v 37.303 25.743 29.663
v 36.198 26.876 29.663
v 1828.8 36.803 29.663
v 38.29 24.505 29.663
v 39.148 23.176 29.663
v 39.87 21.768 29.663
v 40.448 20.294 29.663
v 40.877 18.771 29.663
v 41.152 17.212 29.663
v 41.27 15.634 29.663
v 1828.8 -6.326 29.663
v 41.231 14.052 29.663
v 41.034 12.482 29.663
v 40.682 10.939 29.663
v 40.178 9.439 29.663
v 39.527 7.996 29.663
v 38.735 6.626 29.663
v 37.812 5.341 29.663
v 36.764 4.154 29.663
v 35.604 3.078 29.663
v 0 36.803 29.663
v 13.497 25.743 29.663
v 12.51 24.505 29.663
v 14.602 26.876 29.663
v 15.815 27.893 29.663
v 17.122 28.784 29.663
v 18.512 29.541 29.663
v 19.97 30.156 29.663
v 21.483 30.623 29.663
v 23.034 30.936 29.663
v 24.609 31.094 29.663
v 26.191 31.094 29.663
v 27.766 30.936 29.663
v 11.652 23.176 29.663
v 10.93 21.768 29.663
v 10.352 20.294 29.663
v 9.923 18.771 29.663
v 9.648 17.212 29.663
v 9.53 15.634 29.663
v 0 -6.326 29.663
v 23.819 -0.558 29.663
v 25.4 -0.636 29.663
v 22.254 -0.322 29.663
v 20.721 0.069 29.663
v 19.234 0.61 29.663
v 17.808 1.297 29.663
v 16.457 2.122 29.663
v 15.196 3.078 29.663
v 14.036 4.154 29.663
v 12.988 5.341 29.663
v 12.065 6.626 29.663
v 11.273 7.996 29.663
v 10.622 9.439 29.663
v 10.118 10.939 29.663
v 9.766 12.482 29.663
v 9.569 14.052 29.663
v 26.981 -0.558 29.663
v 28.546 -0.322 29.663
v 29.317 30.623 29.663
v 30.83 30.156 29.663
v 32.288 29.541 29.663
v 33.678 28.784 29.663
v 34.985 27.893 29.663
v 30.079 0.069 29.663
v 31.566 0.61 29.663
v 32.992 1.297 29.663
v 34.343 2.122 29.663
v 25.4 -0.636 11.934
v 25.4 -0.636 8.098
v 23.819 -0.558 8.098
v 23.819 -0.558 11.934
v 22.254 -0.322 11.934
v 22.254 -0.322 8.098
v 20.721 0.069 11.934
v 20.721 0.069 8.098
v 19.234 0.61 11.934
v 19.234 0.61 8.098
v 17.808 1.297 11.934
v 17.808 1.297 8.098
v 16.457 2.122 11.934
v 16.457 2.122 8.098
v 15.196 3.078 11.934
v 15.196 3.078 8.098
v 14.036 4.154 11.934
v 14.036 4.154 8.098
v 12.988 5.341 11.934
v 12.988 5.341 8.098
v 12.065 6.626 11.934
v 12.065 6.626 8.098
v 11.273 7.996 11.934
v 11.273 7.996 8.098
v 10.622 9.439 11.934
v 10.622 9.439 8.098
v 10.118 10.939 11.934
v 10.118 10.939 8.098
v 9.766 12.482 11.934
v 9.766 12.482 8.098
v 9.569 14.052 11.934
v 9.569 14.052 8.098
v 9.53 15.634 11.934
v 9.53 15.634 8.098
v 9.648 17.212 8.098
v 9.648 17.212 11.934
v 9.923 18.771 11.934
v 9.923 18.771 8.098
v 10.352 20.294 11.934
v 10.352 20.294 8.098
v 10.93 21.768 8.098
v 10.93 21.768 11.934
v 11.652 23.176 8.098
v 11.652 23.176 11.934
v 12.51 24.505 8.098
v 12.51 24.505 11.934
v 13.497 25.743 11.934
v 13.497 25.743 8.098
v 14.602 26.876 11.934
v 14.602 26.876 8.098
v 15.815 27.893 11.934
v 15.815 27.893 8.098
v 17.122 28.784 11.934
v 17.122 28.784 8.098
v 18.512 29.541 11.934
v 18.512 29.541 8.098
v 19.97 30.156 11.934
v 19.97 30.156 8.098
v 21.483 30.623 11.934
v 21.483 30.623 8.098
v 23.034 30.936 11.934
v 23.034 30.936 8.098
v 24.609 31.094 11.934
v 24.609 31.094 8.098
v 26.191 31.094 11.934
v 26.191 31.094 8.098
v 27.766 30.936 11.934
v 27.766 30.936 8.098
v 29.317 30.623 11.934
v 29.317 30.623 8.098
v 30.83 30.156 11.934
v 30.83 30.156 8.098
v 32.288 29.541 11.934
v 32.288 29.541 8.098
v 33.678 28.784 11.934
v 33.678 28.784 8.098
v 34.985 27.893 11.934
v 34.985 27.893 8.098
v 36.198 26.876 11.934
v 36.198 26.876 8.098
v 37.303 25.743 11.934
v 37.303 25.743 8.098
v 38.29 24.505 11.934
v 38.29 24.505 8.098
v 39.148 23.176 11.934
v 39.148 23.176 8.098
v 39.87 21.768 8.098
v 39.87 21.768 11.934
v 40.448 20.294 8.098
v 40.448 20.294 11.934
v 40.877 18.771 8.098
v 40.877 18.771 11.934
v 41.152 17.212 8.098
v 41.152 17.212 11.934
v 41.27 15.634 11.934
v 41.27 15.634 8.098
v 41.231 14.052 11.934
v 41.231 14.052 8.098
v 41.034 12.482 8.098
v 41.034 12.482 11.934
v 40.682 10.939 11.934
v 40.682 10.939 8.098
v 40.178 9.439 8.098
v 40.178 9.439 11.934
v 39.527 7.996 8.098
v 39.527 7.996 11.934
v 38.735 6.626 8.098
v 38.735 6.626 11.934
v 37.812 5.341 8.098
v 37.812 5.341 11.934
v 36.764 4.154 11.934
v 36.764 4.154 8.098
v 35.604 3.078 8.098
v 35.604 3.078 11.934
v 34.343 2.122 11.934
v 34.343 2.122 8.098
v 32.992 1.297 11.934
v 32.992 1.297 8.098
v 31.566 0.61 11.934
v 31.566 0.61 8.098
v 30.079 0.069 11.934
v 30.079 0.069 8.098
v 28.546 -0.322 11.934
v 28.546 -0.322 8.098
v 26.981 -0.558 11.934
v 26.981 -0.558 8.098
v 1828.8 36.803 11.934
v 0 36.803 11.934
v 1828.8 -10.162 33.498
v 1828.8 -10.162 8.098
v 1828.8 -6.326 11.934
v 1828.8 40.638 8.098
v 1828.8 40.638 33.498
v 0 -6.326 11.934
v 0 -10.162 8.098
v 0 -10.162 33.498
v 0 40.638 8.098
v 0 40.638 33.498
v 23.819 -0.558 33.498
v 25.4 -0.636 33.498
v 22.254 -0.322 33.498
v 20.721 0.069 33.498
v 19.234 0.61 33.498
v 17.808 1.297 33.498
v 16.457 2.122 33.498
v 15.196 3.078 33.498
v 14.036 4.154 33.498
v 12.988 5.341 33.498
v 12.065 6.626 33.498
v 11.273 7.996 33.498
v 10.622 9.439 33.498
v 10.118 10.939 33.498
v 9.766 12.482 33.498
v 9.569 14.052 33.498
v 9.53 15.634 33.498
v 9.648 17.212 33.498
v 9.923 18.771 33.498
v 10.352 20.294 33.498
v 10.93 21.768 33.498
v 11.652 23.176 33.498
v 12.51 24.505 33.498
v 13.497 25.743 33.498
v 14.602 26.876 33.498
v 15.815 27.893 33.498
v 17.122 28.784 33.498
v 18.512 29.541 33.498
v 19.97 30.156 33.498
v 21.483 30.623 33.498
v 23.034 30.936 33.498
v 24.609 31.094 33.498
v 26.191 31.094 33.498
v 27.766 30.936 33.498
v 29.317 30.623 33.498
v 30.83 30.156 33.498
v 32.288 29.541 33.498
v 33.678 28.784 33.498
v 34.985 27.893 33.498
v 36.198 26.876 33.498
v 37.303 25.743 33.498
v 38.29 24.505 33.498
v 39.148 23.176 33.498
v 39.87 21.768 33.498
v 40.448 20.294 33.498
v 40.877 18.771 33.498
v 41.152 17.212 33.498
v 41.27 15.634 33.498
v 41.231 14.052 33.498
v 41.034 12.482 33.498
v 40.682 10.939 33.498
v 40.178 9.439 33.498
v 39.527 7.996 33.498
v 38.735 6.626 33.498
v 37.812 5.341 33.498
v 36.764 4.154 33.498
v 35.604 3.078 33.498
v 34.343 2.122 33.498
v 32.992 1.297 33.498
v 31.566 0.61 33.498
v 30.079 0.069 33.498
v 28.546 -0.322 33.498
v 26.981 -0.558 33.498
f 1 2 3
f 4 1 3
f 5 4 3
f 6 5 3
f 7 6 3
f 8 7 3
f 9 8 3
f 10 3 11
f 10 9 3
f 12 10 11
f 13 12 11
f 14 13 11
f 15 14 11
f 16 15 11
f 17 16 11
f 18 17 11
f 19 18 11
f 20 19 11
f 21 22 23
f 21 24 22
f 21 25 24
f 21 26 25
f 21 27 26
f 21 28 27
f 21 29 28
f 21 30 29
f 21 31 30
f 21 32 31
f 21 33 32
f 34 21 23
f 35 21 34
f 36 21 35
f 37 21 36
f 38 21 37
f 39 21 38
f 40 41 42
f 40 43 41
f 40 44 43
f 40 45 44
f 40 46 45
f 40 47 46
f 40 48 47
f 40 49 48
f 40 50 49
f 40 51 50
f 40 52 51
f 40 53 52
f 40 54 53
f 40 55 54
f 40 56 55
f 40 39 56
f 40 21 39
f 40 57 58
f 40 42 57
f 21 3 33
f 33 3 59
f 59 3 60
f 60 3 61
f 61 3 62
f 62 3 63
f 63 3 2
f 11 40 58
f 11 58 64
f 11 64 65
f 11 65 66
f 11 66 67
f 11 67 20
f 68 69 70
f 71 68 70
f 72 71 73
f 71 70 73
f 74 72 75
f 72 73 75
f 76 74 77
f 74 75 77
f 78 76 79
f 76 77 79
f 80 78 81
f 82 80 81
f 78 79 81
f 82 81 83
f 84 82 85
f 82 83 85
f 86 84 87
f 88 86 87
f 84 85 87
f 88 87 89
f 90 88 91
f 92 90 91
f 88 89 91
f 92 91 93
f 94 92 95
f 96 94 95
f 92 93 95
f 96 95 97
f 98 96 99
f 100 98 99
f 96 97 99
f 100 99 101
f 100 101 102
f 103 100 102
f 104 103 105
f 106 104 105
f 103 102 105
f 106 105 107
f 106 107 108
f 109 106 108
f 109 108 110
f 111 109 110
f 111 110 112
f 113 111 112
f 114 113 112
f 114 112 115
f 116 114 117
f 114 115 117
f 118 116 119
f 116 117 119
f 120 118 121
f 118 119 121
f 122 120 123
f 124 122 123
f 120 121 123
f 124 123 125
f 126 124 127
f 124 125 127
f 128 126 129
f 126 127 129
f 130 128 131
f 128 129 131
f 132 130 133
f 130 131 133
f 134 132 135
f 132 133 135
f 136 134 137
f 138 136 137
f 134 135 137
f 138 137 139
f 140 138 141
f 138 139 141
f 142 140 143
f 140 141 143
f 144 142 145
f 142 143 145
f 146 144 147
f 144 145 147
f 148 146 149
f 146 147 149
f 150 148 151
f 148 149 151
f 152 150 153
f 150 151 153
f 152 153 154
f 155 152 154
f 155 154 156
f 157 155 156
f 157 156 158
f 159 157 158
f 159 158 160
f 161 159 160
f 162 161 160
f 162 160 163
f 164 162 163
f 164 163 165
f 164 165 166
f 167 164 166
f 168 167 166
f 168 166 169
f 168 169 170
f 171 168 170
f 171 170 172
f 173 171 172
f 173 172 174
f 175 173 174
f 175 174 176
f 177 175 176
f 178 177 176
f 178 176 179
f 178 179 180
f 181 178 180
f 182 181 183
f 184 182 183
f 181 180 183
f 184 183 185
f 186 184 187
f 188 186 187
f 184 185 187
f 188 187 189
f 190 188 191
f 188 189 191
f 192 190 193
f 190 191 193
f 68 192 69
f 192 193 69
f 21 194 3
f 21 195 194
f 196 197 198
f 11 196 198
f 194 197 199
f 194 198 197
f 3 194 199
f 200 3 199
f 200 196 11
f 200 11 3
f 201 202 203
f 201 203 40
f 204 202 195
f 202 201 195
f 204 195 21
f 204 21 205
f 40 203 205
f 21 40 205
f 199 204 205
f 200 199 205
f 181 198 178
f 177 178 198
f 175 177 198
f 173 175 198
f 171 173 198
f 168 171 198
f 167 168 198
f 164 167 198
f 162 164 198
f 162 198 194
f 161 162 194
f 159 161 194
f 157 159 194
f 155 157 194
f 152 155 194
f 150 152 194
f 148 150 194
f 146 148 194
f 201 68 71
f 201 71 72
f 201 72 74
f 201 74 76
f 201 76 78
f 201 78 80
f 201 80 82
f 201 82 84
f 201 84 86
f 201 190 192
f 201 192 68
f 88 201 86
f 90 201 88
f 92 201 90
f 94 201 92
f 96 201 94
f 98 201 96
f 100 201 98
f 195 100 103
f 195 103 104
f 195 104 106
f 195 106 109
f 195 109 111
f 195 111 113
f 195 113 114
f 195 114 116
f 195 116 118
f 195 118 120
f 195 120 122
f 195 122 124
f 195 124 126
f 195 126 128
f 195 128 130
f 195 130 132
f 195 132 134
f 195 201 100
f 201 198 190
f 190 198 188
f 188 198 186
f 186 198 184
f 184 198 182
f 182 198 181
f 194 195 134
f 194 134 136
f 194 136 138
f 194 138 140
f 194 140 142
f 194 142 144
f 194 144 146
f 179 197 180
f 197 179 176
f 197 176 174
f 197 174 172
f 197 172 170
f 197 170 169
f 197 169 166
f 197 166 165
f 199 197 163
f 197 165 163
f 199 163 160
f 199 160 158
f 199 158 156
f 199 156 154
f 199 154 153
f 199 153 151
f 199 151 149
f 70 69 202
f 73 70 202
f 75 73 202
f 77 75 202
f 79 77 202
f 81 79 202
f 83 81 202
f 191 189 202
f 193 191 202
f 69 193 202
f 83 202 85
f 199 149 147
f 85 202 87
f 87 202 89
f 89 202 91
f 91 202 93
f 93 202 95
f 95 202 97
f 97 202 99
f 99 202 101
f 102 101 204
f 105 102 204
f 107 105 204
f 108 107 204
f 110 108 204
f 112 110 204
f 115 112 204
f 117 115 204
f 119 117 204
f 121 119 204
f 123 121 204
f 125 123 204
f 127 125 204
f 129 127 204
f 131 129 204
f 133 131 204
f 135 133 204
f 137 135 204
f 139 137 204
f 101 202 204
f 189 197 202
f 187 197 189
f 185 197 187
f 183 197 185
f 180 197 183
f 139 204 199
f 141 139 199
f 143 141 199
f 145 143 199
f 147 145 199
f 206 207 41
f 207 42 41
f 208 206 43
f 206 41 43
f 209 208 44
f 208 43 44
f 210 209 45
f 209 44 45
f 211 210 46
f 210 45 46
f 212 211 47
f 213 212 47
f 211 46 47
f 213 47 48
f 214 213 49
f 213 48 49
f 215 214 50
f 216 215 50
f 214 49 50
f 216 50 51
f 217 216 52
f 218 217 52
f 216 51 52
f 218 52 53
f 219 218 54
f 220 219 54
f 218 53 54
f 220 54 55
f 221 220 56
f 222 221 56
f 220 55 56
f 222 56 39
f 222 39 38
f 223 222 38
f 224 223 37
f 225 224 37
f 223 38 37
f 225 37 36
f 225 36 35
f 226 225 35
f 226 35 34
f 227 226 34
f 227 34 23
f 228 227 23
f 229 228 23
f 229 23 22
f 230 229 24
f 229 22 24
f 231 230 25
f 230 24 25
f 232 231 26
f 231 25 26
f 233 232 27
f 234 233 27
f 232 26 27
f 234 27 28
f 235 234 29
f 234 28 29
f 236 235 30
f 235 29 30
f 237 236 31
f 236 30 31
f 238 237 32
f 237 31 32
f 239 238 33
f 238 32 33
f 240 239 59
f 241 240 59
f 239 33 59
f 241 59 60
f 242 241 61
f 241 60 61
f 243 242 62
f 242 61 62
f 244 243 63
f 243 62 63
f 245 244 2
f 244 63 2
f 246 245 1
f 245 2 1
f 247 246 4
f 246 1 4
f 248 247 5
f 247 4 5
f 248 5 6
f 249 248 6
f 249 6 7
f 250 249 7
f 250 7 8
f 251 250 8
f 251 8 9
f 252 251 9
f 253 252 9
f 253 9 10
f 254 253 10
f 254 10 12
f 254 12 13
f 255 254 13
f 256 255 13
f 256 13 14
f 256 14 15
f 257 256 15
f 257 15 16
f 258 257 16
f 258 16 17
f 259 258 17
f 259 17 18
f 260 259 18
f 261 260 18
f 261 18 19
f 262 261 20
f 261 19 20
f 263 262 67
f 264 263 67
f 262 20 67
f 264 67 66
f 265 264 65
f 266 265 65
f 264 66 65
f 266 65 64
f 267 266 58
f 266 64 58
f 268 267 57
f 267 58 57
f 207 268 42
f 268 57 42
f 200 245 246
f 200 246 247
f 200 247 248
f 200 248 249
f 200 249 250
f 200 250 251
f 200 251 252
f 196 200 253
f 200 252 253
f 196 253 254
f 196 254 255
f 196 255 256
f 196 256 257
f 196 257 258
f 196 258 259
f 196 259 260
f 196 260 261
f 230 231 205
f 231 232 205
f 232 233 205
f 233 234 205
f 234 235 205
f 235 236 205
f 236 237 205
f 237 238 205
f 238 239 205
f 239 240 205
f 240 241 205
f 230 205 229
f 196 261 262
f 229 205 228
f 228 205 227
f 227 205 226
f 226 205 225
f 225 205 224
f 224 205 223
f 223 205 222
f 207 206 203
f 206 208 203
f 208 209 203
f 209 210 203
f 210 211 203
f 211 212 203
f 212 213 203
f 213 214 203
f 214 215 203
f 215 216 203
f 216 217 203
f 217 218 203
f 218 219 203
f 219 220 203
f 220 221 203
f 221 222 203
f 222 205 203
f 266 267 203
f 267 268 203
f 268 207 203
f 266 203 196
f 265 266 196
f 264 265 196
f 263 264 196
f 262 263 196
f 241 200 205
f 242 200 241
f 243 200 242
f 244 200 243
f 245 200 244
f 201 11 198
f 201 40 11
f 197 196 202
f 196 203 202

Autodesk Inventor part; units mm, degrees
ref_plane "YZ Plane" through (0, 0, 0) normal (1, 0, 0) x (0, 1, 0)
ref_plane "XZ Plane" through (0, 0, 0) normal (0, 1, 0) x (-1, 0, 0)
ref_plane "XY Plane" through (0, 0, 0) normal (0, 0, 1) x (1, 0, 0)
sketch "Sketch3" plane through (0, 0, 0) normal (1, 0, 0) x (0, 1, 0)
  line L0 (36.8031, 29.6629) -> (-6.3261, 29.6629)
  line L1 (-6.3261, 29.6629) -> (-6.3261, 11.9337)
  line L2 (-6.3261, 11.9337) -> (36.8031, 11.9337)
  line L3 (36.8031, 11.9337) -> (36.8031, 29.6629)
  line L4 (40.6385, 33.4983) -> (-10.1615, 33.4983)
  line L5 (-10.1615, 33.4983) -> (-10.1615, 8.0983)
  line L6 (-10.1615, 8.0983) -> (40.6385, 8.0983)
  line L7 (40.6385, 8.0983) -> (40.6385, 33.4983)
  point P0 (0, 0)
  dimension "d2" = 43.1292
  dimension "d3" = 17.7292
  dimension "d4" = 50.8
  dimension "d5" = 25.4
  dimension "d6" = 3.8354
  dimension "d7" = 3.8354
extrude "Extrusion1" add sketch "Sketch3" along normal blind 1828.8
sketch "Sketch4" plane through (0, -10.1615, 33.4983) normal (0, 0, 1) x (1, 0, 0)
  circle A0 centre (25.4, 25.4) radius 14.2875
  line L0 (0, 50.8) -> (1828.8, 50.8) projected
  line L1 (0, 50.8) -> (0, 0) projected
  point P0 (0, 10.1615)
  dimension "d10" = 28.575
  dimension "d11" = 25.4
  dimension "d12" = 25.4
hole "Hole1" at (25.4, 15.2385, 33.4983) direction (0, 0, -1) diameter 31.75 end through all
properties part number "box beam"
